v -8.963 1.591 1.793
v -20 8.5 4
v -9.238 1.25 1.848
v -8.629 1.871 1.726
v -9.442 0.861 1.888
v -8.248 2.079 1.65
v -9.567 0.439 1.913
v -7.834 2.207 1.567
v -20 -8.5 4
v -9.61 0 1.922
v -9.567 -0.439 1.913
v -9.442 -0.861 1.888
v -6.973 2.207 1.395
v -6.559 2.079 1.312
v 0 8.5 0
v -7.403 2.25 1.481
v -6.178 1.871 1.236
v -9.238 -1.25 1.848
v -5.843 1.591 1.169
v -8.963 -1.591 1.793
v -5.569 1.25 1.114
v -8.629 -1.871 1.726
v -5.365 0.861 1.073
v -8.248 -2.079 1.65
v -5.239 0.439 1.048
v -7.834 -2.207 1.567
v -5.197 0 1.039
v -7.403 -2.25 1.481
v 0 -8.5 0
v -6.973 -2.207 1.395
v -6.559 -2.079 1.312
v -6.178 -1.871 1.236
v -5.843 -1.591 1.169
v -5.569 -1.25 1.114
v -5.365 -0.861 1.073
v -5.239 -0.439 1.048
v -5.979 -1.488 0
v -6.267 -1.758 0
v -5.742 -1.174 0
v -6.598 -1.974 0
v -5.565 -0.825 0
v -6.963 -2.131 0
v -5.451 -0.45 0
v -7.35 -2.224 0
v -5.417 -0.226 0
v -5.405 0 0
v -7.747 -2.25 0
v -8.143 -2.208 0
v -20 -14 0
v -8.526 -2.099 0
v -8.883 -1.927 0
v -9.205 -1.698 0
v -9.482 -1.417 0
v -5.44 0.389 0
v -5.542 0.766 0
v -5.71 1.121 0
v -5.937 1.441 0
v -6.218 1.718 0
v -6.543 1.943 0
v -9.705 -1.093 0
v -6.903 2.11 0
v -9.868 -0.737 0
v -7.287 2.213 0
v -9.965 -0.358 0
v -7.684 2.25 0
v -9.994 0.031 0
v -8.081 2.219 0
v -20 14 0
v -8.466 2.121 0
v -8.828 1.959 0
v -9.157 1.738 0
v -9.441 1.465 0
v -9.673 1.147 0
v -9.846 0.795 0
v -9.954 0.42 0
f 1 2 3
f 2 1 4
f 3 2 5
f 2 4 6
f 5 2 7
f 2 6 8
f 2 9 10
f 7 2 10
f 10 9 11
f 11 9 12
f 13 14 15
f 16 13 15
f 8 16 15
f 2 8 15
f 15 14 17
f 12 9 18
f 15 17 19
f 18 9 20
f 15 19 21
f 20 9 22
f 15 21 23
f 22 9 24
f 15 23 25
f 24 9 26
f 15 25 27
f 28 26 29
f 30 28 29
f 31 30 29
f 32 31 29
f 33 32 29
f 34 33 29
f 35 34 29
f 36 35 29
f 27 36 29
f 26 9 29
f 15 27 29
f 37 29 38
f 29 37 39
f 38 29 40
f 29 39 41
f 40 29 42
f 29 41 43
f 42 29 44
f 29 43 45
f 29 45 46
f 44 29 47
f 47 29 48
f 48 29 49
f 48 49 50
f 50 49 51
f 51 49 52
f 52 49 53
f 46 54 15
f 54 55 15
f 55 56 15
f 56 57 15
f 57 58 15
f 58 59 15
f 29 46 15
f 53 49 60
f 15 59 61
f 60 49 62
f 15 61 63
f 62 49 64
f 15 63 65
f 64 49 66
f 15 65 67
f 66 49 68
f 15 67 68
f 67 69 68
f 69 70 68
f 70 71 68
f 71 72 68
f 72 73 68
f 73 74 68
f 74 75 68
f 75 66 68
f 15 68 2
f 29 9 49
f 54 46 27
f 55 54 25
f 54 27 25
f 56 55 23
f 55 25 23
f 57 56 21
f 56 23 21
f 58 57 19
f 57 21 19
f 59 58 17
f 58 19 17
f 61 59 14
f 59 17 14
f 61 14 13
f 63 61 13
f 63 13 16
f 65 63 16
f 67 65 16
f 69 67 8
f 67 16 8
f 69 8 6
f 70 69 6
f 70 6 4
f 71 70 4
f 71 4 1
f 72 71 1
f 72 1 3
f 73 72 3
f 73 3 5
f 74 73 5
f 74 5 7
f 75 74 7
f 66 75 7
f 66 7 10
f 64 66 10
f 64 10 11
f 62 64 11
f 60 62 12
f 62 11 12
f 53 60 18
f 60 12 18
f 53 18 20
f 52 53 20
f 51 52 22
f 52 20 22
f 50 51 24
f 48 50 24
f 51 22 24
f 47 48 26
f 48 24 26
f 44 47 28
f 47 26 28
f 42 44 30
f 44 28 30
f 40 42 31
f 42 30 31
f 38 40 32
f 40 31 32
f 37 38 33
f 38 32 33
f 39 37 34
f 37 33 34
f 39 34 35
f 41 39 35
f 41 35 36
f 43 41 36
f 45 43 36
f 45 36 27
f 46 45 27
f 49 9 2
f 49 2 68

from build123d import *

# Parameters (mm, degrees)
F3_DEPTH  = 20
F4_DEPTH  = 25
F6_DEPTH  = 12.5
F8_W      = 30.1884743385
F8_H      = 13.3378984174
F9_DEPTH  = 25
F11_W     = 24.1160430014
F11_H     = 17.3639170825
F12_DEPTH = 25
F13_R     = 2.25
F14_DEPTH = 25


with BuildPart() as f3:
    # F2 (on line) → F3 (new body)
    with BuildSketch(Plane.YZ.offset(-20)):
        Polygon((-14, 0), (14, 0), (8.5, 4), (-8.5, 4), align=None)
    extrude(amount=F3_DEPTH)

    # F0 (on Top) → F4 (cut)
    with BuildSketch(Plane.XY):
        Polygon((0, -14), (0, -8.5), (-20, -14), align=None)
        Polygon((-20, 14), (0, 8.5), (0, 14), align=None)
    extrude(amount=F4_DEPTH, mode=Mode.SUBTRACT)

    # F5 (on Front) → F6 (cut, symmetric)
    with BuildSketch(Plane.XZ):
        Polygon((-20, 4), (0, 0), (0, 4), align=None)
    extrude(amount=F6_DEPTH, both=True, mode=Mode.SUBTRACT)

    # F8 (on 3pt) → F9 (cut)
    with BuildSketch(Plane(origin=(0.788032027, 2.8655710072, 3.9401601349), x_dir=(0.9871701202, -0.0939145628, -0.1291325238), z_dir=(0.1596720195, 0.5806255255, 0.7983600975))):
        with Locations((-12.3789033387, 7.5781916385)):
            Rectangle(F8_W, F8_H)
    extrude(amount=F9_DEPTH, mode=Mode.SUBTRACT)

    # F11 (on 3pt) → F12 (cut)
    with BuildSketch(Plane(origin=(0.788032027, -2.8655710072, 3.9401601349), x_dir=(0.9871701202, 0.0939145628, -0.1291325238), z_dir=(0.1596720195, -0.5806255255, 0.7983600975))):
        with Locations((-12.0580215007, -6.2219202518)):
            Rectangle(F11_W, F11_H)
    extrude(amount=F12_DEPTH, mode=Mode.SUBTRACT)

    # F13 (on face) → F14 (cut)
    with BuildSketch(Plane(origin=(0, 0, 0), x_dir=(0.9805806757, 0, -0.1961161351), z_dir=(0.1961161351, 0, 0.9805806757))):
        with Locations((-7.55, 0)):
            Circle(F13_R)
    extrude(amount=-F14_DEPTH, mode=Mode.SUBTRACT)


solid = f3.part
